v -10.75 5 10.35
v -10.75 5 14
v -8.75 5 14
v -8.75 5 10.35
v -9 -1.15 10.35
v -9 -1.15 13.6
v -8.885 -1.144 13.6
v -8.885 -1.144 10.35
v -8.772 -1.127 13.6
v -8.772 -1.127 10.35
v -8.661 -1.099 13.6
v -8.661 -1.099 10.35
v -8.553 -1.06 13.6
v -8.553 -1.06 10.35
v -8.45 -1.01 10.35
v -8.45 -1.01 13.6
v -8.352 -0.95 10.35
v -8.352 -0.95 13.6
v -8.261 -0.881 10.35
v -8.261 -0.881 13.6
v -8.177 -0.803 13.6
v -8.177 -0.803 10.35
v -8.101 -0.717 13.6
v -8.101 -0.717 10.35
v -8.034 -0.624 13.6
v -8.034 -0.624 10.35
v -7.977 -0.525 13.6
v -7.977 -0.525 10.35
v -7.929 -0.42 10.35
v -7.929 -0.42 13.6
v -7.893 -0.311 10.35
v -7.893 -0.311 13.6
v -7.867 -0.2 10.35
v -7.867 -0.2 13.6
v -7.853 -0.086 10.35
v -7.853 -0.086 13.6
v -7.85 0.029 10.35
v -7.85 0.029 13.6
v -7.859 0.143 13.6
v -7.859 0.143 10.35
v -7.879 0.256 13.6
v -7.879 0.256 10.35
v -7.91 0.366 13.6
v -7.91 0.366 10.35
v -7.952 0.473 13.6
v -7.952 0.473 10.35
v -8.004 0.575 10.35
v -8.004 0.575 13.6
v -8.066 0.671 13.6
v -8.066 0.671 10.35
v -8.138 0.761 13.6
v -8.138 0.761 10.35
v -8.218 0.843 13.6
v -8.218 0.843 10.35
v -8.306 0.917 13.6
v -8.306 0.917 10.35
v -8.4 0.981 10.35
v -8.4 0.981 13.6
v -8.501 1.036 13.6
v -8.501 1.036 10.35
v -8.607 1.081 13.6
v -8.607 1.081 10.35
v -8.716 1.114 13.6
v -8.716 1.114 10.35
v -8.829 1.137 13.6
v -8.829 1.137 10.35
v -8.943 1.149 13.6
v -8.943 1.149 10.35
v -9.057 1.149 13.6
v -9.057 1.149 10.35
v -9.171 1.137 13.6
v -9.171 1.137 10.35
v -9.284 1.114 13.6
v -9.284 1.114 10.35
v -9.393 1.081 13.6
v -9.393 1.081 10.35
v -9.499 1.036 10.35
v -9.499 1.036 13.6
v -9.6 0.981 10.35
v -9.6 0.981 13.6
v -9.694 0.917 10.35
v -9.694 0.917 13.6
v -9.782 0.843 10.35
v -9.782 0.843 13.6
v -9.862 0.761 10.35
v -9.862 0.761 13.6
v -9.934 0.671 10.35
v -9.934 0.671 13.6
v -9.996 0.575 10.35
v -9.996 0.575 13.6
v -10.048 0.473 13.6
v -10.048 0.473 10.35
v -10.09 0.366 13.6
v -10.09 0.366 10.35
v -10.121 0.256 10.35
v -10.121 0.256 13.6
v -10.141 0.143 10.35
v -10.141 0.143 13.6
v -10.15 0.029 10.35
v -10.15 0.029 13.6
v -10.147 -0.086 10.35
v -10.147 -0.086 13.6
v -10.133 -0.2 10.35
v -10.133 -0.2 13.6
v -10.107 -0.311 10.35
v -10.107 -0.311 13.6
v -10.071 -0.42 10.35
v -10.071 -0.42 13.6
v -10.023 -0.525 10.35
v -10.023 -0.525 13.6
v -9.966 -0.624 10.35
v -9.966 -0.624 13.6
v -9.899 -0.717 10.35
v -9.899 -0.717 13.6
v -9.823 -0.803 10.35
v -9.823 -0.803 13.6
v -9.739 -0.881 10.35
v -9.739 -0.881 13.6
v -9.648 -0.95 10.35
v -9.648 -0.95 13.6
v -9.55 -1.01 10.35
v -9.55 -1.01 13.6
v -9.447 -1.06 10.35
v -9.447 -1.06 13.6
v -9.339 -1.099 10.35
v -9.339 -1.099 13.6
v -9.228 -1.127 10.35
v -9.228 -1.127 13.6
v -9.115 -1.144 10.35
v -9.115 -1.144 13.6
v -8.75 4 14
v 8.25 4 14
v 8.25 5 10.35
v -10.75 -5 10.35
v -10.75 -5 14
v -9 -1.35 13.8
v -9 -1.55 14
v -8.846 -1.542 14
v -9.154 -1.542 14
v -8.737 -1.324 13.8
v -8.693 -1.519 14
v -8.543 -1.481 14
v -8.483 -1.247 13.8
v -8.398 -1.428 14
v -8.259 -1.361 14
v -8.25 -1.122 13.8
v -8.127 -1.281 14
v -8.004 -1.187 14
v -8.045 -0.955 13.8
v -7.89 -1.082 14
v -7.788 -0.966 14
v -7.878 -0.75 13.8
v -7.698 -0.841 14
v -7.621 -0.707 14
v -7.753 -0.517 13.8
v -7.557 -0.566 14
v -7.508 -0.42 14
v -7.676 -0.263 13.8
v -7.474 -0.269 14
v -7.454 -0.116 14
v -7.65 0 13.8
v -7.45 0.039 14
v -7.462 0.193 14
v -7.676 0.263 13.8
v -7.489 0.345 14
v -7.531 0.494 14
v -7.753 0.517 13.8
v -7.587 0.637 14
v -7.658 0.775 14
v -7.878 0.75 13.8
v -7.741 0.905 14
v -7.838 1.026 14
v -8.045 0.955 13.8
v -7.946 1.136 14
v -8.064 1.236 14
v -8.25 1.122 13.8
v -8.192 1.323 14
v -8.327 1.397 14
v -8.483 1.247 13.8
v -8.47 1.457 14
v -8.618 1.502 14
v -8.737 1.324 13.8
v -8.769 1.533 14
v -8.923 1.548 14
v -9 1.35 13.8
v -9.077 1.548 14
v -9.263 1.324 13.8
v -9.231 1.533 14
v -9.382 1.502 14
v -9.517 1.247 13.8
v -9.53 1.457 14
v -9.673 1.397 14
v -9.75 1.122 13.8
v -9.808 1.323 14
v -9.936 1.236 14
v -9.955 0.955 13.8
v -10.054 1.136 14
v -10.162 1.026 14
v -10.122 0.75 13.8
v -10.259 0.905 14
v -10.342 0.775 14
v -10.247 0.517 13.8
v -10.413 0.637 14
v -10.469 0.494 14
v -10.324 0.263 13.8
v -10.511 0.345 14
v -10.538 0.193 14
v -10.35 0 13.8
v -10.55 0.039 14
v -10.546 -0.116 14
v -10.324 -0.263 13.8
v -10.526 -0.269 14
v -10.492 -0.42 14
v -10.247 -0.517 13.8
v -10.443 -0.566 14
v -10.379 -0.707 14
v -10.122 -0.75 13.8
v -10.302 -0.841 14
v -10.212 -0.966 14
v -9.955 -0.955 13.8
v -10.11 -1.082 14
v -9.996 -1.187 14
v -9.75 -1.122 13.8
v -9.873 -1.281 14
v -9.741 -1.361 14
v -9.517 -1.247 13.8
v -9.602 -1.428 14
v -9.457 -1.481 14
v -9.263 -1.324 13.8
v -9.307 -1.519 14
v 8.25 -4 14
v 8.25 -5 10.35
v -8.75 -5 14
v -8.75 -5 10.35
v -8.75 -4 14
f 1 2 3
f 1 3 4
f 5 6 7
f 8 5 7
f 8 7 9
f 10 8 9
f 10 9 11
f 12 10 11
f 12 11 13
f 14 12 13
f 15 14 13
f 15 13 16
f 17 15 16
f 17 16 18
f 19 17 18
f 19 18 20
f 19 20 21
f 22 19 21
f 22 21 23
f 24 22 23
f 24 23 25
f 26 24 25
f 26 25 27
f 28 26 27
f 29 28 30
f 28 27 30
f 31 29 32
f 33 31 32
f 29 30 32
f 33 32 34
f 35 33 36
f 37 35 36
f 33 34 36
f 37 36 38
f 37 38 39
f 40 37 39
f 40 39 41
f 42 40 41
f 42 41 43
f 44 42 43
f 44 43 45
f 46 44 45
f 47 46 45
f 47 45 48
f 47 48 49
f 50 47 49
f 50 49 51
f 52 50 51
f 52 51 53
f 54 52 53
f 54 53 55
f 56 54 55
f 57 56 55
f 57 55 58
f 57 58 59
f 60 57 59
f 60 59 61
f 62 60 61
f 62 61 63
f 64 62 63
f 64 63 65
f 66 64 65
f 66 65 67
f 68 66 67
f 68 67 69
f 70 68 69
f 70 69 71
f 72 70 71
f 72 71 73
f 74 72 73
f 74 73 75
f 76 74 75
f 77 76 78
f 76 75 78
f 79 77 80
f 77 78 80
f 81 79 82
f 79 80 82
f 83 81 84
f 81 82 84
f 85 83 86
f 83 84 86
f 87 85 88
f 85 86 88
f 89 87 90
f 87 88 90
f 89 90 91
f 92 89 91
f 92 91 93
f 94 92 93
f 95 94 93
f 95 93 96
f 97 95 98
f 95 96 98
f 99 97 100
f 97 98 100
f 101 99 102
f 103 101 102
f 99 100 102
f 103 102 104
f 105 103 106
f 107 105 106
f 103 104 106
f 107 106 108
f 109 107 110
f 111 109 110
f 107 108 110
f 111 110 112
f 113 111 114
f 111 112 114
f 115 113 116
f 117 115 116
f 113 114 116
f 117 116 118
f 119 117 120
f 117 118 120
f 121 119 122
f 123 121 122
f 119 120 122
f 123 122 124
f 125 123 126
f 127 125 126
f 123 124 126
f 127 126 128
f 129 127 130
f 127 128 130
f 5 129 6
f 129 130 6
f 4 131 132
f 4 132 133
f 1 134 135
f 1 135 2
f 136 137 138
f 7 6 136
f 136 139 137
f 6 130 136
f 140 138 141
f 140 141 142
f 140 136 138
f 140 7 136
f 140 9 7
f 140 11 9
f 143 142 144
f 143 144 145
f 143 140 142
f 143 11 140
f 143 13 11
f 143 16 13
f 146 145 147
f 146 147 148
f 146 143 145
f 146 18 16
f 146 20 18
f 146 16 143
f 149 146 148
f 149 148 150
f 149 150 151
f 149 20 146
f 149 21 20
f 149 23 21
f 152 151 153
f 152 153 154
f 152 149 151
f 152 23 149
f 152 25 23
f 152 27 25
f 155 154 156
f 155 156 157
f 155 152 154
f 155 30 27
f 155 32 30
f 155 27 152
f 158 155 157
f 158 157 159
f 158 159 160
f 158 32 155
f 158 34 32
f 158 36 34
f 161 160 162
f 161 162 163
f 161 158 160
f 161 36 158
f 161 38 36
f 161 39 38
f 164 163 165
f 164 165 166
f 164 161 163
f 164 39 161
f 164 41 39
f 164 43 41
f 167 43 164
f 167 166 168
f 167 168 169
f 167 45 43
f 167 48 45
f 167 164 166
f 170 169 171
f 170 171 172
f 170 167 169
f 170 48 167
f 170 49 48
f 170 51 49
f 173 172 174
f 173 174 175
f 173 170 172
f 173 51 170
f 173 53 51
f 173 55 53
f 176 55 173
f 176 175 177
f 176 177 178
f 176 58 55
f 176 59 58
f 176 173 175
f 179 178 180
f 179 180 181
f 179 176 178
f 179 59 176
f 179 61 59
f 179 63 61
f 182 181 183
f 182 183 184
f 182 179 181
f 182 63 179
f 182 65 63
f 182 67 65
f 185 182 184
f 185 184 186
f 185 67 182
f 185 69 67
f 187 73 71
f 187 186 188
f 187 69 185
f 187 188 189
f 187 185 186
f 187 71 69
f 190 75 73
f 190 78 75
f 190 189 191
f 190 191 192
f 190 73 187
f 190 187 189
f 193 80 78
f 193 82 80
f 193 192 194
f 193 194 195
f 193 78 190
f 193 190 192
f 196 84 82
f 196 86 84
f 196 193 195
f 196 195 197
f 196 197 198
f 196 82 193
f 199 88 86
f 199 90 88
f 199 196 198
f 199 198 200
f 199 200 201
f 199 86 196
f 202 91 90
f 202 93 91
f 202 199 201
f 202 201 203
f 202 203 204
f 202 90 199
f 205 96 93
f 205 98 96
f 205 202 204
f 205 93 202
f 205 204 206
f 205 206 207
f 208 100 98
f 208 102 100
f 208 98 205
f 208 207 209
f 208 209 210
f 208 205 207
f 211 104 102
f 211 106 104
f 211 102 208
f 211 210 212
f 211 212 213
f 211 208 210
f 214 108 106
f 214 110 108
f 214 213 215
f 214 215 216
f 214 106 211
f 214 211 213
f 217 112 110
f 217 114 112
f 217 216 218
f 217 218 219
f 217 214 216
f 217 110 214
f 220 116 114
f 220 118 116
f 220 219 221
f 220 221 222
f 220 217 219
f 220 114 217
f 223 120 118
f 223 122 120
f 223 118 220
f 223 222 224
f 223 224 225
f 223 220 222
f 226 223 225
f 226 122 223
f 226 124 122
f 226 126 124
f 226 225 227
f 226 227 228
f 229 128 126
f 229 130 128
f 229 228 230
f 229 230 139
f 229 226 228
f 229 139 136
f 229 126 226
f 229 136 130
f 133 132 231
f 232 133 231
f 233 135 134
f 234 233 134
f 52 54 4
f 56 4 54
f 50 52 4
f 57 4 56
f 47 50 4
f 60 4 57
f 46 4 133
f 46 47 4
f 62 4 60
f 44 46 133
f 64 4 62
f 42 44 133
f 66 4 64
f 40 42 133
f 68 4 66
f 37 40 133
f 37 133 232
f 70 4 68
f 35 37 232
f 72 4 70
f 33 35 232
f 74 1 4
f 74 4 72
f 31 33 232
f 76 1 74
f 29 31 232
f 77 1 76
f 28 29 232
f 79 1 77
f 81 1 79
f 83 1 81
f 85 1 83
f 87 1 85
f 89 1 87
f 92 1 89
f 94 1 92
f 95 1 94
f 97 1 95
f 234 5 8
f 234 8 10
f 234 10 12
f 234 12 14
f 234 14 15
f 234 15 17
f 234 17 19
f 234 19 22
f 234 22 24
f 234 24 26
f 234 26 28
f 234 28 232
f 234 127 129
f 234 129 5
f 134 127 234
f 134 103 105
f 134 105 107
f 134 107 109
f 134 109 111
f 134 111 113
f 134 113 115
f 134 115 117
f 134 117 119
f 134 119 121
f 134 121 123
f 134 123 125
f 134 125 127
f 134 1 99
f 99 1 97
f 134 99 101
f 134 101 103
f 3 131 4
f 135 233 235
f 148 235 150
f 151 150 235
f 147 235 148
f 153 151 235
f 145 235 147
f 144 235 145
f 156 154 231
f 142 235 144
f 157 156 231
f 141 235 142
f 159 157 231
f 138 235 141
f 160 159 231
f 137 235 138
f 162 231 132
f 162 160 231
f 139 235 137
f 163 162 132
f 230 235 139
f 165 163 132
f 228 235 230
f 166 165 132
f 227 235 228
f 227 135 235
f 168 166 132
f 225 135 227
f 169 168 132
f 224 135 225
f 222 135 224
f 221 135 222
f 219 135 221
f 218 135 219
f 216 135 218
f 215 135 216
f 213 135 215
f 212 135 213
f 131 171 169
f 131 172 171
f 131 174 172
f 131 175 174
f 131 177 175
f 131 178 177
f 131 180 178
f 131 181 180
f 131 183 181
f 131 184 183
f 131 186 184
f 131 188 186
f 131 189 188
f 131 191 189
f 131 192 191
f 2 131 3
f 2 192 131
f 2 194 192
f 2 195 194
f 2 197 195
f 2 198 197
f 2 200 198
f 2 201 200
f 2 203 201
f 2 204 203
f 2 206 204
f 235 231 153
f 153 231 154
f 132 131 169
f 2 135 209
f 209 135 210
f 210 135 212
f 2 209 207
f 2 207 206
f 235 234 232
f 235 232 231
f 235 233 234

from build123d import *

# Parameters (mm, degrees)
PAD004_DEPTH    = 19
SKETCH019_W     = 10
SKETCH019_H     = 3.65
PAD005_DEPTH    = 2
SKETCH020_R     = 1.15
POCKET016_DEPTH = 3.651
CHAMFER001_SIZE = 0.4


with BuildPart() as part:
    # Sketch018 → Pad004 (new body)
    with BuildSketch(Plane.YZ):
        Polygon((-4, 0), (4, 0), (5, -3.65), (-5, -3.65), align=None)
    extrude(amount=PAD004_DEPTH)

    # Sketch019 (on Face5 of Pad004) → Pad005 (join)
    with BuildSketch(Plane(origin=(0, 0, 0), x_dir=(0, 1, 0), z_dir=(-1, 0, 0))):
        with Locations((0, 1.825)):
            Rectangle(SKETCH019_W, SKETCH019_H)
    extrude(amount=-PAD005_DEPTH)

    # Sketch020 (on Face8 of Pad005) → Pocket016 (cut, through all)
    with BuildSketch(Plane(origin=(0, 0, 0), x_dir=(0, -1, 0), z_dir=(0, 0, 1))):
        with Locations((0, 1.75)):
            Circle(SKETCH020_R)
    extrude(amount=-POCKET016_DEPTH, mode=Mode.SUBTRACT)

    # Chamfer001
    chamfer001_edges = [part.edges().sort_by_distance(p)[0] for p in [
        (1.75, 1.15, 0),
    ]]
    chamfer(chamfer001_edges, length=CHAMFER001_SIZE)


with BuildPart() as part_1:
    # Body001 placement: moved
    add(part.part.moved(Location((-10.75, 0, 14))))


solid = part_1.part
